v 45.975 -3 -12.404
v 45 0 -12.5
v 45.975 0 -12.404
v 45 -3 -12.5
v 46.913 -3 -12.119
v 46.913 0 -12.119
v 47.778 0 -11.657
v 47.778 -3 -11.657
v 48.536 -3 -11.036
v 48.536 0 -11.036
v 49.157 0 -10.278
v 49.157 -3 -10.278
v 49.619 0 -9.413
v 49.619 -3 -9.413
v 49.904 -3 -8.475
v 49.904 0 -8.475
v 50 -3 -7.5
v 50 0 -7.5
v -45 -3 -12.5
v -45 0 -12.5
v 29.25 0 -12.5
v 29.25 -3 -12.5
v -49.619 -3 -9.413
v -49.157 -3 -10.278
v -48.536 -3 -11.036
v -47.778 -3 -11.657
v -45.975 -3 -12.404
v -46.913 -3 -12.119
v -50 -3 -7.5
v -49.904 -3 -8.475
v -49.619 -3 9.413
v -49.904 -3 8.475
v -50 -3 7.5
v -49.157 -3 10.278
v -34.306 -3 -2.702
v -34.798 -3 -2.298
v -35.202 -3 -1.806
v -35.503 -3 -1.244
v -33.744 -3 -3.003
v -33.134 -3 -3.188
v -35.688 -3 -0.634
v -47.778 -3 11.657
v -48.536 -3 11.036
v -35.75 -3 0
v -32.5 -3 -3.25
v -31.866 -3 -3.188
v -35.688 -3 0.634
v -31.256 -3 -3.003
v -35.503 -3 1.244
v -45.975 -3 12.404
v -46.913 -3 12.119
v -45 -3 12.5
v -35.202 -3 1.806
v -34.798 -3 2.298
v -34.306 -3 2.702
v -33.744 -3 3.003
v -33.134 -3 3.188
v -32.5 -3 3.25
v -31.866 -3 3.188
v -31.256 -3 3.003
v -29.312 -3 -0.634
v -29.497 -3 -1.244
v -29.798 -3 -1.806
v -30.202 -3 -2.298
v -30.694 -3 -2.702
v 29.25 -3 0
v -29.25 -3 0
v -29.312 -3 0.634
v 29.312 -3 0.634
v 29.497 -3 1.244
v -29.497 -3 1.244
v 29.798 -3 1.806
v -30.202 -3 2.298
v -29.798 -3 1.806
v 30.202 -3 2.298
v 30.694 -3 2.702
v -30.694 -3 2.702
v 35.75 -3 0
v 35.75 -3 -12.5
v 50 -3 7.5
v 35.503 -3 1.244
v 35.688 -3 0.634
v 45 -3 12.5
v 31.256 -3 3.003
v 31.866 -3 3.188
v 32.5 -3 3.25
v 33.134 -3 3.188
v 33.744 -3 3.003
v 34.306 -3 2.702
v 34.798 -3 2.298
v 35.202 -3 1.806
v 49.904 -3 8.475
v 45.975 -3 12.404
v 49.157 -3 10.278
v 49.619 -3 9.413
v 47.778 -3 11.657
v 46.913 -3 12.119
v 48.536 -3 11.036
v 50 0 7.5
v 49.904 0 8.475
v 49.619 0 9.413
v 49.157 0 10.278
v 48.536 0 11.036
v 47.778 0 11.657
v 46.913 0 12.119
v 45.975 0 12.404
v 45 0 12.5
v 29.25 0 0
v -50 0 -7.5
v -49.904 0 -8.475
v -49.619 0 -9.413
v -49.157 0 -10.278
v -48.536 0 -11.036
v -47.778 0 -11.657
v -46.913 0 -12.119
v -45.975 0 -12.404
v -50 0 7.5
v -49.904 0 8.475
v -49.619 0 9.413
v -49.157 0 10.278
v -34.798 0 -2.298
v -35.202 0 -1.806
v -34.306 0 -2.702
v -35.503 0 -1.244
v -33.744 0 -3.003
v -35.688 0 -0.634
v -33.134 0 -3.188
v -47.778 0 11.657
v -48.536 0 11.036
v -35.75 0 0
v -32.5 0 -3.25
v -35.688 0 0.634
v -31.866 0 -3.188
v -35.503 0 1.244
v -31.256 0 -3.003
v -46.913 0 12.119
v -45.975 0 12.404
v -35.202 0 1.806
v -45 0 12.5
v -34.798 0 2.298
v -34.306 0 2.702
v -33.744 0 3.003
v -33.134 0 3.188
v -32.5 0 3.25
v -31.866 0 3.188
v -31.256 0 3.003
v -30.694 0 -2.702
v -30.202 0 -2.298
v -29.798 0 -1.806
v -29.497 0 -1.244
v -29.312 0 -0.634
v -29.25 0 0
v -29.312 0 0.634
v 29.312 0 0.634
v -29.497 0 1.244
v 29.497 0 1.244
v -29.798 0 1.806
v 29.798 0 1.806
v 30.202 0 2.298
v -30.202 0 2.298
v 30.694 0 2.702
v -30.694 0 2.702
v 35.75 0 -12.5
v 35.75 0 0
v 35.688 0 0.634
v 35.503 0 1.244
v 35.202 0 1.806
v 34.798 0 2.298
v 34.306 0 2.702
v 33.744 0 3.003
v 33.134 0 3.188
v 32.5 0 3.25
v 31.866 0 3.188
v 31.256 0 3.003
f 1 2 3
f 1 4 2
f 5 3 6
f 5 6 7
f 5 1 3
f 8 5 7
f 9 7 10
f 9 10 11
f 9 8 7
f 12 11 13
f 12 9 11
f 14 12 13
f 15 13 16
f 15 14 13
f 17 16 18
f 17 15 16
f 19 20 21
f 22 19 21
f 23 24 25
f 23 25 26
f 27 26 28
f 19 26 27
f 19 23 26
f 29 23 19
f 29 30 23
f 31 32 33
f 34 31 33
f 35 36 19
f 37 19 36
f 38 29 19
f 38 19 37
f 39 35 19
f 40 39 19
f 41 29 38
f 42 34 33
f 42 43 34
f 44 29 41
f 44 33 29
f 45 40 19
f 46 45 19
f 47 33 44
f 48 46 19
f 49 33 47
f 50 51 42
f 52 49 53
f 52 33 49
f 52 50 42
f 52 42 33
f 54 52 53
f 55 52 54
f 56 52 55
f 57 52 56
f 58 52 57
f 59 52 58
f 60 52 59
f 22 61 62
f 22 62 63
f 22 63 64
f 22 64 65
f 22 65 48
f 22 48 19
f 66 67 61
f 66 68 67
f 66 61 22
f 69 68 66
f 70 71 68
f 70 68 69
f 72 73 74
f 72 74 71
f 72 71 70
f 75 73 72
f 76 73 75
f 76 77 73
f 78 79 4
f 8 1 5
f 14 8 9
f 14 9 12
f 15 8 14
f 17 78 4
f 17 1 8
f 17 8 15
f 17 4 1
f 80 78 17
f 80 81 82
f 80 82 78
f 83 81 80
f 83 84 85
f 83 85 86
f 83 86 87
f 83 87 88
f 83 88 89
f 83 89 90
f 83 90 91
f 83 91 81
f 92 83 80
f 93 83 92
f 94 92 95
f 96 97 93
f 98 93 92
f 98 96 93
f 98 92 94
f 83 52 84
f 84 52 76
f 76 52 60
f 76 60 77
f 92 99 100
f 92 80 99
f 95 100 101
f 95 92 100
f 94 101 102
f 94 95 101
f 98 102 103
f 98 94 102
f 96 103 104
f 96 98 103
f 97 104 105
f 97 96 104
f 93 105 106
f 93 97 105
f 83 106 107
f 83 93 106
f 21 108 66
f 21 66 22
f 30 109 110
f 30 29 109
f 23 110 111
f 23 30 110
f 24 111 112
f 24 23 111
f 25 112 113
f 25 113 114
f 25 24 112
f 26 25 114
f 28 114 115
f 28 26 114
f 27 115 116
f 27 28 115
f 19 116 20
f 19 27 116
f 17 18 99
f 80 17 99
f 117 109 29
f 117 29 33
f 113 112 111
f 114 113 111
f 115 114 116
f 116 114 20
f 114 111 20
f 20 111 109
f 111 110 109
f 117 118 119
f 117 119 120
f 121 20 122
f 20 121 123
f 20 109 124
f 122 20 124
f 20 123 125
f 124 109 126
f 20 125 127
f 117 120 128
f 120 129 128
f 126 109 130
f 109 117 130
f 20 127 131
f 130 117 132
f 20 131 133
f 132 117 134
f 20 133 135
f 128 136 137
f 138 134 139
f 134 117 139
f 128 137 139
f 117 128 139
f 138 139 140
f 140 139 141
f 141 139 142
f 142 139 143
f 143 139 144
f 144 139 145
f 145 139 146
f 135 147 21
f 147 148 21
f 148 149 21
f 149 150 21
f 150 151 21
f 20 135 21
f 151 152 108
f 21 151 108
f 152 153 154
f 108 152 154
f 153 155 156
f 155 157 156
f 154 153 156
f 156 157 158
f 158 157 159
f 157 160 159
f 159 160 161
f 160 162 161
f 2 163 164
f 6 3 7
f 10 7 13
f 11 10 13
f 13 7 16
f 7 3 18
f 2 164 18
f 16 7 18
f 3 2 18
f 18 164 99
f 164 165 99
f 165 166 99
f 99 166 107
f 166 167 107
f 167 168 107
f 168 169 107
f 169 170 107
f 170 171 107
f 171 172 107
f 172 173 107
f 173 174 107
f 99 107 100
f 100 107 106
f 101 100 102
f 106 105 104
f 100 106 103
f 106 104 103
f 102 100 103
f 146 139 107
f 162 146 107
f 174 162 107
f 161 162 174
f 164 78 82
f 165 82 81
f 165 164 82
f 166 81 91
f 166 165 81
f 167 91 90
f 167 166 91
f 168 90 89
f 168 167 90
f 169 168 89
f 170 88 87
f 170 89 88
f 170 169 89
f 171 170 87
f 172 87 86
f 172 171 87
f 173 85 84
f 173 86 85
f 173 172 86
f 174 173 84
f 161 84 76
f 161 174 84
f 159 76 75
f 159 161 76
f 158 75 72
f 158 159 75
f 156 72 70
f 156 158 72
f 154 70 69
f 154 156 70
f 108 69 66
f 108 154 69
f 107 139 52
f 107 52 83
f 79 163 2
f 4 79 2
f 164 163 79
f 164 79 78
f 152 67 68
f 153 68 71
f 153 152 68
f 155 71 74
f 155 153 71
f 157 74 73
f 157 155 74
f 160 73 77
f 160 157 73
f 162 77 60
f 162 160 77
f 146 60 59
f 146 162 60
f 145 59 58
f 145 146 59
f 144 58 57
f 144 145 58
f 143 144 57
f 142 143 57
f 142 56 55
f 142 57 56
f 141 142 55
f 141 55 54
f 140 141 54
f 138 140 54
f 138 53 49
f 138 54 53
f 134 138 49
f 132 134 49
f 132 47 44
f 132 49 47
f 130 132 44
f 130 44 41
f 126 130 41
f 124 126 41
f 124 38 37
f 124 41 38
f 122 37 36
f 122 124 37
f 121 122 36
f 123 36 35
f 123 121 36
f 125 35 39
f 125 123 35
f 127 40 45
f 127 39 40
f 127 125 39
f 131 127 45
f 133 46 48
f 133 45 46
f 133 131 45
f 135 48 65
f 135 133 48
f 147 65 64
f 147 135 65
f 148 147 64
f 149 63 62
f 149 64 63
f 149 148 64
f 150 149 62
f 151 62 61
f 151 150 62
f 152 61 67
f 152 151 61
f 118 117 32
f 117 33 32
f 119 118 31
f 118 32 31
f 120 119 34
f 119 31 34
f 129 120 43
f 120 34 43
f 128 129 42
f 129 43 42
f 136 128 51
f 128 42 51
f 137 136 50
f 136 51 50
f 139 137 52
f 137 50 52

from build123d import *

# Parameters (mm, degrees)
F0_W     = 100
F0_H     = 25
F1_DEPTH = 3
F2_R     = 5
F3_R     = 3.25
F4_DEPTH = 25


with BuildPart() as f1:
    # F0 (on Front) → F1 (new body)
    with BuildSketch(Plane.XZ):
        Rectangle(F0_W, F0_H)
    extrude(amount=F1_DEPTH)

    # F2
    f2_edges = [f1.edges().sort_by_distance(p)[0] for p in [
        (50, -1.5, 12.5),
        (50, -1.5, -12.5),
        (-50, -1.5, -12.5),
        (-50, -1.5, 12.5),
    ]]
    fillet(f2_edges, radius=F2_R)

    # F3 (on Front) → F4 (cut)
    with BuildSketch(Plane.XZ):
        with BuildLine():
            Line((35.75, -17.689867), (35.75, 0))
            ThreePointArc((35.75, 0), (32.5, 3.25), (29.25, 0))
            Line((29.25, 0), (29.25, -17.689867))
            Line((29.25, -17.689867), (35.75, -17.689867))
        make_face()
        with Locations((-32.5, 0)):
            Circle(F3_R)
    extrude(amount=F4_DEPTH, mode=Mode.SUBTRACT)


solid = f1.part
